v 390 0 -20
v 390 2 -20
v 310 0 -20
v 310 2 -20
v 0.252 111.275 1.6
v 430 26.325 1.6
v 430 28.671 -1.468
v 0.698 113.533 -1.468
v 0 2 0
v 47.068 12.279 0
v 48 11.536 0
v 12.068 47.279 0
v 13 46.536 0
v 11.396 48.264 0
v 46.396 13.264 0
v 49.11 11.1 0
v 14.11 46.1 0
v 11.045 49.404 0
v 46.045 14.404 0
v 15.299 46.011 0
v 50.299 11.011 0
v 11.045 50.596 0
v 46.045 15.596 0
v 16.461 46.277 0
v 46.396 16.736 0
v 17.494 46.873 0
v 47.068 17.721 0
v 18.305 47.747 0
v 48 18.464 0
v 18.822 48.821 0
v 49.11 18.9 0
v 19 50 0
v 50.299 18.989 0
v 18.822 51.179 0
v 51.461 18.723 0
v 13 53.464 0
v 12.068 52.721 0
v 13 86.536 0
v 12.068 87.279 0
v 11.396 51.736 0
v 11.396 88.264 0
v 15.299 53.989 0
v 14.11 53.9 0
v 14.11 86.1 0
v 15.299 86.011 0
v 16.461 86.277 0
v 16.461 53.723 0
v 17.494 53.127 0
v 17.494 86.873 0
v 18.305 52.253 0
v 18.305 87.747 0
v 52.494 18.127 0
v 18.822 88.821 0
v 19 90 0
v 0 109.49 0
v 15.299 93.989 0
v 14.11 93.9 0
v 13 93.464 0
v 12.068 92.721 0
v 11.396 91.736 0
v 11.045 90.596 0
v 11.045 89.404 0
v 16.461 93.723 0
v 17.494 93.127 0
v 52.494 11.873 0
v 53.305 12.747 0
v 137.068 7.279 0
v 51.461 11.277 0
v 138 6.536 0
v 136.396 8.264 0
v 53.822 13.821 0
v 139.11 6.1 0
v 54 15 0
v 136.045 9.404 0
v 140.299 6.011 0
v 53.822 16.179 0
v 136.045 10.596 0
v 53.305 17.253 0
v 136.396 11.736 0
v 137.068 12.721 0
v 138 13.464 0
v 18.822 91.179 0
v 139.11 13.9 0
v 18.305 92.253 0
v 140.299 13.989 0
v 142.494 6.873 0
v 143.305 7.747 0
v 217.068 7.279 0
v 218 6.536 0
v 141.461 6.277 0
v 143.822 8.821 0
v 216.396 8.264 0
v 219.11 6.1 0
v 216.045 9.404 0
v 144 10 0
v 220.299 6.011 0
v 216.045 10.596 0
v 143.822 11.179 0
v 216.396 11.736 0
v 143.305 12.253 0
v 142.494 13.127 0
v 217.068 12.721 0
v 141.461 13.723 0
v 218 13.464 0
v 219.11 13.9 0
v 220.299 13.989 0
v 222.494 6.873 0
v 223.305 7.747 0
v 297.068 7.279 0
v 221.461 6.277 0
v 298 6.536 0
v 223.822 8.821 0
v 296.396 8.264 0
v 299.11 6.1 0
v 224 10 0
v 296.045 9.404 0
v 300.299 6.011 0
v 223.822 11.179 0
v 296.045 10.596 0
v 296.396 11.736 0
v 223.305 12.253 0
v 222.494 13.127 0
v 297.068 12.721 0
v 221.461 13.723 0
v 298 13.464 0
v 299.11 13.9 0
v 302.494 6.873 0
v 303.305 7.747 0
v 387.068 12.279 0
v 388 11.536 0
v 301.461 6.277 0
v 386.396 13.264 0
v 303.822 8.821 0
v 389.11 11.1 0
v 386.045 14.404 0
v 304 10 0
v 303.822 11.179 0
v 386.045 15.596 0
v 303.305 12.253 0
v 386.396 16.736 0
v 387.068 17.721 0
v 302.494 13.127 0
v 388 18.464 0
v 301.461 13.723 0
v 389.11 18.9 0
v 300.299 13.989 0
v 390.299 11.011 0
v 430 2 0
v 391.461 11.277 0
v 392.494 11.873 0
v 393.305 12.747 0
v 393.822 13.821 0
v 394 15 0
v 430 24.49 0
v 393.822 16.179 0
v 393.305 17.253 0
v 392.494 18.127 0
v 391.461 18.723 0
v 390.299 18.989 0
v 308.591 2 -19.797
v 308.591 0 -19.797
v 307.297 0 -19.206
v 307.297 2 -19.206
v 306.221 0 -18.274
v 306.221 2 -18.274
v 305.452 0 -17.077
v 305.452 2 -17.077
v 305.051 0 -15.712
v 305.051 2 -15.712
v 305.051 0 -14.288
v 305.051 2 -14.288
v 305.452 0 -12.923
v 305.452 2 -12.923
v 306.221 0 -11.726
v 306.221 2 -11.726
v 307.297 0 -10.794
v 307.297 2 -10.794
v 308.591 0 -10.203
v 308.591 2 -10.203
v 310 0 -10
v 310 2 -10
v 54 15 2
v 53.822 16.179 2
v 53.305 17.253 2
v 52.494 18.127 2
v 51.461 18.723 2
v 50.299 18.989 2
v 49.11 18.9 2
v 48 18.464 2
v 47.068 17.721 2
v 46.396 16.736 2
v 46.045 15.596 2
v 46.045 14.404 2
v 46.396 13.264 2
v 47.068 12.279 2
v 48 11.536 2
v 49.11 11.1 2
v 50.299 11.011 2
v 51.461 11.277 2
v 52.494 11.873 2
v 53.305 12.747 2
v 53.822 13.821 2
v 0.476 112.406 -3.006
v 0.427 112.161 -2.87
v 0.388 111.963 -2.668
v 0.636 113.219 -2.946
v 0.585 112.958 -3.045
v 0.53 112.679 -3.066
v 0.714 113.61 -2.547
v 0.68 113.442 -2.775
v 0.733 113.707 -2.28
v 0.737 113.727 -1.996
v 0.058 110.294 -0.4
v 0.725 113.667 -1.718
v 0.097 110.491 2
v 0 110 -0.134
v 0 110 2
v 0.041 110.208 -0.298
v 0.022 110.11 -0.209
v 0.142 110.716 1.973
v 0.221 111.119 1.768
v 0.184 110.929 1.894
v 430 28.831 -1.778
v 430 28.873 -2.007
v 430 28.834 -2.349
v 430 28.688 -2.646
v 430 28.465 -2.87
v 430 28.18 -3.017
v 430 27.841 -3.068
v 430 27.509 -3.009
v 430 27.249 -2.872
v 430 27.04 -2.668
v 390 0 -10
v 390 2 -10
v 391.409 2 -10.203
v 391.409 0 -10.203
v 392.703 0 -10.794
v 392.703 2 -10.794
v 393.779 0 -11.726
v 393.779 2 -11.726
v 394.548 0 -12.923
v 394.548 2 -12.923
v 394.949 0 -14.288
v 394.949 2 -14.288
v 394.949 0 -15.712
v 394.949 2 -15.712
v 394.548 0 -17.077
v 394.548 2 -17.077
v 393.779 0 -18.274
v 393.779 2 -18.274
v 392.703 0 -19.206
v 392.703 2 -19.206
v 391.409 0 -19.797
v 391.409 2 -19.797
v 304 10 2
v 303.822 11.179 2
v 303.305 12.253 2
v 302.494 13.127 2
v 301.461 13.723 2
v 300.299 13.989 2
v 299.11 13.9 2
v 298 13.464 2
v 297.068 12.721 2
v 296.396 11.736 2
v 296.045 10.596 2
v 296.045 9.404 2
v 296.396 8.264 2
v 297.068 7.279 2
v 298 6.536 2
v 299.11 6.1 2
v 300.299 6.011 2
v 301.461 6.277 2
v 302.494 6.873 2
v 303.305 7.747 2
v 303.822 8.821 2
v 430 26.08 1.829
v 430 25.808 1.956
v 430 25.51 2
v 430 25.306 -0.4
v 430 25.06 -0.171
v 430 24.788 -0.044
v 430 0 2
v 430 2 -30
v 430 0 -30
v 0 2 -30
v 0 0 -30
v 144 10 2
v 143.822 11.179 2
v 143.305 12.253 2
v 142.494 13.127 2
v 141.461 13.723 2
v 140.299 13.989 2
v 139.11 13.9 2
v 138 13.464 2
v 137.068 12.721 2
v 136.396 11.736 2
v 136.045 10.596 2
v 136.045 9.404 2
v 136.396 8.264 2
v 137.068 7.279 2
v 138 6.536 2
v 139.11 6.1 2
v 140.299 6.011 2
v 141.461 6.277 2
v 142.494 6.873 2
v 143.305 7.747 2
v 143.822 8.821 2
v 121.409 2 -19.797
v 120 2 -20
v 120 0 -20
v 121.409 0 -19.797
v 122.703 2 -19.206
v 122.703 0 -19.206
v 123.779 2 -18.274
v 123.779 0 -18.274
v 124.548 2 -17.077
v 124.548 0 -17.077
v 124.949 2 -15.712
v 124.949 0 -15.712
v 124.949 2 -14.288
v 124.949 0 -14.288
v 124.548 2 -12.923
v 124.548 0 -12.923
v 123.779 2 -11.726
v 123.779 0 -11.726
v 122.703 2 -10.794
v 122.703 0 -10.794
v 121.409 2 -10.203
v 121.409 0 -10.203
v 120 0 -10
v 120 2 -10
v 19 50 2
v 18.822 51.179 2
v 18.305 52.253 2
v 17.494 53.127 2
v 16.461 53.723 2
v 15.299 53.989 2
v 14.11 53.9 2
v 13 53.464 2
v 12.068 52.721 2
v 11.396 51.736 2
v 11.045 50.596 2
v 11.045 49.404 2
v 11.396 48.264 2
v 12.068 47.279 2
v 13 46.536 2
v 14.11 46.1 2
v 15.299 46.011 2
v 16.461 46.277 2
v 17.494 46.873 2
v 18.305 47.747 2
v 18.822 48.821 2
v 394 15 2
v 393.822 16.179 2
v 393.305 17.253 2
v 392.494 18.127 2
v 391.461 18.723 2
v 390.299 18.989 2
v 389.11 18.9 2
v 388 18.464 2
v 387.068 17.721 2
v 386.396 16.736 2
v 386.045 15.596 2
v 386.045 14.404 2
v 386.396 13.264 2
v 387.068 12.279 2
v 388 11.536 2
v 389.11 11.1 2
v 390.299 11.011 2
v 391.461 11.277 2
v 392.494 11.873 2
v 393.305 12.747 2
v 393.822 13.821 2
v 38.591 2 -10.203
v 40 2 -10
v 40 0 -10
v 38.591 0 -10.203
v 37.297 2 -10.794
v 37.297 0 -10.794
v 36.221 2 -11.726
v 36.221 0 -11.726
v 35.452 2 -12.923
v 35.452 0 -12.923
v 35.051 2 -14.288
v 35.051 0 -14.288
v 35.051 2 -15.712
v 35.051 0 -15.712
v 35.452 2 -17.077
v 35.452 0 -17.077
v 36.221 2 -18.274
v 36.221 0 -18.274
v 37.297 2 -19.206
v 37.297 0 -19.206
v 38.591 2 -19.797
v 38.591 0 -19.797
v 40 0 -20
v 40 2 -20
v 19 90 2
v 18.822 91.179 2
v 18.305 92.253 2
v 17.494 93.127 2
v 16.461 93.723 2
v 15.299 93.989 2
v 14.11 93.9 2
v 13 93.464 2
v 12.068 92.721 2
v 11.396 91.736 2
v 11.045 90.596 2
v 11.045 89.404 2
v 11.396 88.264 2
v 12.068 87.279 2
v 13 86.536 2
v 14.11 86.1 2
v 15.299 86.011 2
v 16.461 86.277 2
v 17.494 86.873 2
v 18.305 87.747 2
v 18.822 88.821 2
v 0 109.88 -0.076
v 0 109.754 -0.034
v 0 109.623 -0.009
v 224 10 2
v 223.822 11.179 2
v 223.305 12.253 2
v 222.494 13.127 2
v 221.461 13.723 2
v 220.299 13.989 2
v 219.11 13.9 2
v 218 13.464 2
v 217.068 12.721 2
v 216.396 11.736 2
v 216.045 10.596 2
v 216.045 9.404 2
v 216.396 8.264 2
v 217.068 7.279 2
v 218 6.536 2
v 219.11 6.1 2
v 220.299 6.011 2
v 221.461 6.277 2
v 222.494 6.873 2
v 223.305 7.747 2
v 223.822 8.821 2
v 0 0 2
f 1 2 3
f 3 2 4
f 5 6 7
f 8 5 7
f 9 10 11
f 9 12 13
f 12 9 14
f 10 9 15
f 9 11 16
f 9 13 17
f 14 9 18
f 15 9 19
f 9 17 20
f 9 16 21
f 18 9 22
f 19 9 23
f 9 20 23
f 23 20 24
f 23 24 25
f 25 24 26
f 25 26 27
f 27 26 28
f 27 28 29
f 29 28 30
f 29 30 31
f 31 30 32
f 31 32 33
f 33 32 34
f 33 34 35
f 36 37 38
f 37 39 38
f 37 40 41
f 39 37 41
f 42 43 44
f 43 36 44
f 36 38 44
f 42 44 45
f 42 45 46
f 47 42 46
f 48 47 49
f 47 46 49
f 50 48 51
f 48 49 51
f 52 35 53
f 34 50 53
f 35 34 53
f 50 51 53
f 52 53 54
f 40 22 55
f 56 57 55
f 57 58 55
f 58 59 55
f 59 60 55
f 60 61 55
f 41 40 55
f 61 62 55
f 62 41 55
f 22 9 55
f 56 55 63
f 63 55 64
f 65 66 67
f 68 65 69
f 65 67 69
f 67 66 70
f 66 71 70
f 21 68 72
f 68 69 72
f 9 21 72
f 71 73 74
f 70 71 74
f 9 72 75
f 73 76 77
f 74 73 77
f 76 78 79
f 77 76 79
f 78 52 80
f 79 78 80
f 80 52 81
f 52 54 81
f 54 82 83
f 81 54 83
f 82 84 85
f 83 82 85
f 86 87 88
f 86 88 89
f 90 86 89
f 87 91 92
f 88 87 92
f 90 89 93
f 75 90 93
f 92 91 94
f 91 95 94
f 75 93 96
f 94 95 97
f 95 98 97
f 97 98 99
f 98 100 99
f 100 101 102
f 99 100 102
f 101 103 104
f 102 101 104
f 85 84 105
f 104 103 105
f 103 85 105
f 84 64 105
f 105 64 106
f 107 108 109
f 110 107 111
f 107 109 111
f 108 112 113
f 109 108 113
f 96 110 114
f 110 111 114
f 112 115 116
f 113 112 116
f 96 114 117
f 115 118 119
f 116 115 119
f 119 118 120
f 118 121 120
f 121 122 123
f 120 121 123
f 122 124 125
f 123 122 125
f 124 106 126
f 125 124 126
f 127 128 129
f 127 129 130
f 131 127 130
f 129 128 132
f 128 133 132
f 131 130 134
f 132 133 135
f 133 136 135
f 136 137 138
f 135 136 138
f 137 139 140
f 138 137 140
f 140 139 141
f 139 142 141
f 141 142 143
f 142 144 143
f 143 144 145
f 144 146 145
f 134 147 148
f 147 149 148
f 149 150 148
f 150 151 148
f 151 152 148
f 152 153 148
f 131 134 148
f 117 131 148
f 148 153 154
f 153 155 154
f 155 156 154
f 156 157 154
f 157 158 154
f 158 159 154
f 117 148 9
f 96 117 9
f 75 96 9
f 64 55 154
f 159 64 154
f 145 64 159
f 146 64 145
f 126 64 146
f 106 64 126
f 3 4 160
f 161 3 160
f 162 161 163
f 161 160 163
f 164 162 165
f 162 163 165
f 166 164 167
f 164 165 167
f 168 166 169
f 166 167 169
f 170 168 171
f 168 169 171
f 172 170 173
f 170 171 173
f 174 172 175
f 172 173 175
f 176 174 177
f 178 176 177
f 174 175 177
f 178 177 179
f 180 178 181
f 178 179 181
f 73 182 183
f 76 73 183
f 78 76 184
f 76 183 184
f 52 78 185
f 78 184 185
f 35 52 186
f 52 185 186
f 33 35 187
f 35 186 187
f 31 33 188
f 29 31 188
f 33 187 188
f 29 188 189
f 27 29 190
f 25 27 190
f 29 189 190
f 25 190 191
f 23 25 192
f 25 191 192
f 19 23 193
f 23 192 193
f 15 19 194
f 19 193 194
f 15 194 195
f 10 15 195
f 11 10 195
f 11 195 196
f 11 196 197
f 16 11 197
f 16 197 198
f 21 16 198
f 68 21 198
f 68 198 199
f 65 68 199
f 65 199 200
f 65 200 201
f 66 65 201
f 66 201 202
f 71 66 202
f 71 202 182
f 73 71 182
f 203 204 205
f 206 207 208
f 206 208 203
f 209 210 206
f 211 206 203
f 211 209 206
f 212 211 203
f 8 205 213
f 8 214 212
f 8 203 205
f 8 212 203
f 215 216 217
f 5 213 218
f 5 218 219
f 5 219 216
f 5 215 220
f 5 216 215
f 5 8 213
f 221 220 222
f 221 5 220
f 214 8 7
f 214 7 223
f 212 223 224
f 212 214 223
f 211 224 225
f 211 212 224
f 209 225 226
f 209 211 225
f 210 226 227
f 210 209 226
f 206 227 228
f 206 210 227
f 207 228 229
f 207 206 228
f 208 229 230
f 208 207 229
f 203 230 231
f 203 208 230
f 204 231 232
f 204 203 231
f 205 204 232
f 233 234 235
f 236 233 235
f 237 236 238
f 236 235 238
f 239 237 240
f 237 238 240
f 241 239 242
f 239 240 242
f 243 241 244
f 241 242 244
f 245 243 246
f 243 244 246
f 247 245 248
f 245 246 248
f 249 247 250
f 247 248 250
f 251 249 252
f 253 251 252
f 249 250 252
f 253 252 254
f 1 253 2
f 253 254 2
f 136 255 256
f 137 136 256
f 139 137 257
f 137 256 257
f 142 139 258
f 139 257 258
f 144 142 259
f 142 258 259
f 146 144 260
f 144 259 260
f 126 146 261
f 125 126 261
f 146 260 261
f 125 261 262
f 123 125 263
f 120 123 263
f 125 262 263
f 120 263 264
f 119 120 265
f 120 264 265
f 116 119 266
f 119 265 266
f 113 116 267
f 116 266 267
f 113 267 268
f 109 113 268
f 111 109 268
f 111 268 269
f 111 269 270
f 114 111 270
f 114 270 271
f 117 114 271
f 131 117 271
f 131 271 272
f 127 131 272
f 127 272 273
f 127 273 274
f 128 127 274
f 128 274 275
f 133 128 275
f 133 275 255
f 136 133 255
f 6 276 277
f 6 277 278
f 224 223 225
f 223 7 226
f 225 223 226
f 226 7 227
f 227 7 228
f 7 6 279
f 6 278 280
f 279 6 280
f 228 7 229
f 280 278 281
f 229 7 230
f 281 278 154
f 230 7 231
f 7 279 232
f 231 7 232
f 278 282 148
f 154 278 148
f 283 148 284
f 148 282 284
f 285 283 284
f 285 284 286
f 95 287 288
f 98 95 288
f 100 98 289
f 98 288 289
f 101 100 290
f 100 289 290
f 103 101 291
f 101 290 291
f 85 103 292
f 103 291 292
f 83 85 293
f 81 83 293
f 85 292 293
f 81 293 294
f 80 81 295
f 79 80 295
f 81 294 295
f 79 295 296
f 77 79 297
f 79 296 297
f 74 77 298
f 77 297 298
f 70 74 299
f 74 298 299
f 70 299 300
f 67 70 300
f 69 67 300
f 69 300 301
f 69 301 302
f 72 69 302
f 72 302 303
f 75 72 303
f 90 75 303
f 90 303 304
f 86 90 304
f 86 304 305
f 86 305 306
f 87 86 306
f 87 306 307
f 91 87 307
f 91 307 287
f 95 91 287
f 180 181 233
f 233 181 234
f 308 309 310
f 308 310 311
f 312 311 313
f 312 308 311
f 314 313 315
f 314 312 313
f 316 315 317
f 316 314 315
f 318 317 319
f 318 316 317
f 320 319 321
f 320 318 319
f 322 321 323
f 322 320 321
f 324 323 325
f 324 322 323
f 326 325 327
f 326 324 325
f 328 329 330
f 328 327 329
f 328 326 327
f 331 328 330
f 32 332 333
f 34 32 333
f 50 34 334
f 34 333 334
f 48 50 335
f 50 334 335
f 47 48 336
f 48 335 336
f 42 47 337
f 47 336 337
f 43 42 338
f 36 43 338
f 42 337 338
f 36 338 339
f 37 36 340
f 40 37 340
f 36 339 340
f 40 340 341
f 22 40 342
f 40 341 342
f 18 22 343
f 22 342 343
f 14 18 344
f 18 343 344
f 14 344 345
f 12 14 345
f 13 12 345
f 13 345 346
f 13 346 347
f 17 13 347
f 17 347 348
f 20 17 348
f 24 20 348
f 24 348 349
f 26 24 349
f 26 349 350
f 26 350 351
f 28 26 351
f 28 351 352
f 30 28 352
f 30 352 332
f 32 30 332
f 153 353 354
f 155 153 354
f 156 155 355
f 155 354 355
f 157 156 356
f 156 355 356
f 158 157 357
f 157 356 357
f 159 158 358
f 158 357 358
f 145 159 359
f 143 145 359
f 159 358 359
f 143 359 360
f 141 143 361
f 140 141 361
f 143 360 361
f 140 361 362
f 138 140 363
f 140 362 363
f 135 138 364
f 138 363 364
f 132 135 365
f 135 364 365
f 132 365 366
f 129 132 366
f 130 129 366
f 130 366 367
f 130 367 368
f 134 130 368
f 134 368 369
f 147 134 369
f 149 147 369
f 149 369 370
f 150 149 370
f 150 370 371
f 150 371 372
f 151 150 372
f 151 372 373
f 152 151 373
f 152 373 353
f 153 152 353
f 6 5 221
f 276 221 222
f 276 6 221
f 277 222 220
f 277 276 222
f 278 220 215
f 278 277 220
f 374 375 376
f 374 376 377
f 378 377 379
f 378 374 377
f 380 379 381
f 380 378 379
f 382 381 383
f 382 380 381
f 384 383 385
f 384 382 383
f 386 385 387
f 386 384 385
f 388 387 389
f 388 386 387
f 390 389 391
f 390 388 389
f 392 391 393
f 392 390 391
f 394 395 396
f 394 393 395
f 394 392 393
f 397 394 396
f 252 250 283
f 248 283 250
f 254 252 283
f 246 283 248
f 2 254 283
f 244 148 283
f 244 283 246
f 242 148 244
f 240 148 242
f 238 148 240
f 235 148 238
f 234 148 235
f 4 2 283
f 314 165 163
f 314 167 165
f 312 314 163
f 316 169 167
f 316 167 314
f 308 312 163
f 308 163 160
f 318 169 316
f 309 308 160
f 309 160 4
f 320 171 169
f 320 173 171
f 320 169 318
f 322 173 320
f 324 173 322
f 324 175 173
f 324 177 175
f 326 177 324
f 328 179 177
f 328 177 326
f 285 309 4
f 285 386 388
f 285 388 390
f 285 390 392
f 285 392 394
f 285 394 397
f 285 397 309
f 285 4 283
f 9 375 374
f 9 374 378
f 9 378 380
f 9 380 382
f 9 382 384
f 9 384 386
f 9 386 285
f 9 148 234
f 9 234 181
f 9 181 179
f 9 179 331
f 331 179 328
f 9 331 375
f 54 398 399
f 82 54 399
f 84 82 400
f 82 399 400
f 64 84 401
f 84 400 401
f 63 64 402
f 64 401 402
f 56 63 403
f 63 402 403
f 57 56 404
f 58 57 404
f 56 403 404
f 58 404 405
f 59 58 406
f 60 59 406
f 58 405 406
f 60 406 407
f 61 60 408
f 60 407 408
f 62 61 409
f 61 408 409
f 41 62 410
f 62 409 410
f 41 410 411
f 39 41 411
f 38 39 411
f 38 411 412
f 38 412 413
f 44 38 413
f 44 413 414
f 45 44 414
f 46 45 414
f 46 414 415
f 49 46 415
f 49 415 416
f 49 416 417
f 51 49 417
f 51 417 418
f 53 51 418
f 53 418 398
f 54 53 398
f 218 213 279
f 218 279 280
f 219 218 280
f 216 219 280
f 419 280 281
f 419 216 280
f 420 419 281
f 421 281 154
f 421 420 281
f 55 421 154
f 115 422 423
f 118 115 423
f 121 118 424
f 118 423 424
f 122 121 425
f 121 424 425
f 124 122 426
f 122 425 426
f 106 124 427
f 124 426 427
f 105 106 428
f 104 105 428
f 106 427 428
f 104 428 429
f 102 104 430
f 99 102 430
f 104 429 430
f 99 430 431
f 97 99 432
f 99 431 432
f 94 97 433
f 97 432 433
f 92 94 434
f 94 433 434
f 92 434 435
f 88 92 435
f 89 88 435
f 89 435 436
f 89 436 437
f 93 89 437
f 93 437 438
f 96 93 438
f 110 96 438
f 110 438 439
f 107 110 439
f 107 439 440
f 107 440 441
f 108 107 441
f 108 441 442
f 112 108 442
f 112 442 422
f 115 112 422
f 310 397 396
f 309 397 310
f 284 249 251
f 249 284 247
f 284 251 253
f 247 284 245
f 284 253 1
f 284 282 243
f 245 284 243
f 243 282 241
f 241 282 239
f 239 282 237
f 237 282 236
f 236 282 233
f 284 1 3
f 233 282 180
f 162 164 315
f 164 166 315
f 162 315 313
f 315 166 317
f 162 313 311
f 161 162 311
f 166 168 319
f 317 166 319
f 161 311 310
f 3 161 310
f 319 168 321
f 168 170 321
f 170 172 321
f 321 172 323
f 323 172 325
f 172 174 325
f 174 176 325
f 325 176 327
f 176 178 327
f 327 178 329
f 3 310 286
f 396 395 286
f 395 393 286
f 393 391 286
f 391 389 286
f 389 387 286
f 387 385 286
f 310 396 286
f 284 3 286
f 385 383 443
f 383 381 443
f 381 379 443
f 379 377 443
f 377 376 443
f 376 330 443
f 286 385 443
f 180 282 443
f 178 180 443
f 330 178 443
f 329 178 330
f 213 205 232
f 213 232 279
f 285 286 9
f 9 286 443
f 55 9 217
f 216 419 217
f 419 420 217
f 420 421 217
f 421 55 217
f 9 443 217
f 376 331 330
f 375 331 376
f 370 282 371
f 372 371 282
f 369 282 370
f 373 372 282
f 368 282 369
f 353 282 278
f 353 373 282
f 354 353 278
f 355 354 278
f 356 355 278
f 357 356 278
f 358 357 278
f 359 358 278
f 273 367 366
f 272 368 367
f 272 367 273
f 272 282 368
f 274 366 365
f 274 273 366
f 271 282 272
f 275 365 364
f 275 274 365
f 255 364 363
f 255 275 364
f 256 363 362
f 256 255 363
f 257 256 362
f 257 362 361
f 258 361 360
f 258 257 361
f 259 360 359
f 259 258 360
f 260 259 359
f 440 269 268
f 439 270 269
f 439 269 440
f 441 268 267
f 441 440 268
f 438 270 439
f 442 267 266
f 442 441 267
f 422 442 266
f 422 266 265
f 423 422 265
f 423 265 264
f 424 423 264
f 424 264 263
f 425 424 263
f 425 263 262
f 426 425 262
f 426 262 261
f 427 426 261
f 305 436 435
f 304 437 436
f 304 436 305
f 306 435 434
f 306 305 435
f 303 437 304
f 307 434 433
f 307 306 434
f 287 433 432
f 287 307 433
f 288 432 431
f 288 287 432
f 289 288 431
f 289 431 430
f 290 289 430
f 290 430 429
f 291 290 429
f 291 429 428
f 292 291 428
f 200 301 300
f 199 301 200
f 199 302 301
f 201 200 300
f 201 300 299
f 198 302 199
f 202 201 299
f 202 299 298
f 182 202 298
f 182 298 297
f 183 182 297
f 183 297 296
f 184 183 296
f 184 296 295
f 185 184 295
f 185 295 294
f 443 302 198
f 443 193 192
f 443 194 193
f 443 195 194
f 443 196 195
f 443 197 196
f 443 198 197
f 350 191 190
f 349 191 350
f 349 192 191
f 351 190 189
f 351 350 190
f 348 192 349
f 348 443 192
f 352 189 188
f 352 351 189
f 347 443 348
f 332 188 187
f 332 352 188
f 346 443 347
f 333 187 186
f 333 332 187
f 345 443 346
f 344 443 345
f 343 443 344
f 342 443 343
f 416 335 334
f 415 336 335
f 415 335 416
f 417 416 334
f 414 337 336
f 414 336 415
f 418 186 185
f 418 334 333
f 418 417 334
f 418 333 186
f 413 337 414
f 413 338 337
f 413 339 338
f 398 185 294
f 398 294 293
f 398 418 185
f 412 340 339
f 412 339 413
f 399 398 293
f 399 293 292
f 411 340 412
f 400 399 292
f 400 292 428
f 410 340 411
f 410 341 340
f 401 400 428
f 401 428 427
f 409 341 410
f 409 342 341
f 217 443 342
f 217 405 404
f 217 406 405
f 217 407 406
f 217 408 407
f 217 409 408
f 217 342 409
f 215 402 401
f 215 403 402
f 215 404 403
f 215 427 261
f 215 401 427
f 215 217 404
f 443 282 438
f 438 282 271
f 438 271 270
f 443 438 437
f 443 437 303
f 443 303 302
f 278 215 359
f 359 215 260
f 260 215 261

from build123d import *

# Parameters (mm, degrees)
BOSS_EXTRUDE1_DEPTH = 2
SKETCH3_W           = 430
SKETCH3_H           = 2
BOSS_EXTRUDE2_DEPTH = 30
CUT_EXTRUDE1_DEPTH  = 50
SKETCH7_R           = 4
CUT_EXTRUDE2_DEPTH  = 445.998876403
SKETCH8_R           = 4
CUT_EXTRUDE3_DEPTH  = 445.998876403
BOSS_EXTRUDE4_REACH = 466.157
FILLET3_R           = 1


with BuildPart() as part:
    # Sketch2 → Boss-Extrude1 (new body)
    with BuildSketch(Plane.XY):
        Polygon((0, 0), (430, 0), (430, 25), (0, 110), align=None)
    extrude(amount=BOSS_EXTRUDE1_DEPTH)

    # Sketch3 → Boss-Extrude2 (add)
    with BuildSketch(Plane(origin=(0, 0, 0), x_dir=(-1, 0, 0), z_dir=(0, 0, -1))):
        with Locations((-215, 1)):
            Rectangle(SKETCH3_W, SKETCH3_H)
    extrude(amount=BOSS_EXTRUDE2_DEPTH)

    # Sketch4 → Cut-Extrude1 (cut)
    with BuildSketch(Plane(origin=(0, 2, 0), x_dir=(1, 0, 0), z_dir=(0, 1, 0))):
        with BuildLine():
            Line((40, 20), (120, 20))
            ThreePointArc((120, 20), (125, 15), (120, 10))
            Line((120, 10), (40, 10))
            ThreePointArc((40, 10), (35, 15), (40, 20))
        make_face()
        with BuildLine():
            Line((390, 20), (310, 20))
            ThreePointArc((310, 20), (305, 15), (310, 10))
            Line((310, 10), (390, 10))
            ThreePointArc((390, 10), (395, 15), (390, 20))
        make_face()
    extrude(amount=-CUT_EXTRUDE1_DEPTH, mode=Mode.SUBTRACT)

    # Sketch7 → Cut-Extrude2 (cut, through all)
    with BuildSketch(Plane.XY.offset(2)):
        with Locations((15, 50)):
            Circle(SKETCH7_R)
        with Locations((50, 15)):
            Circle(SKETCH7_R)
        with Locations((390, 15)):
            Circle(SKETCH7_R)
        with Locations((15, 90)):
            Circle(SKETCH7_R)
    extrude(amount=-CUT_EXTRUDE2_DEPTH, mode=Mode.SUBTRACT)

    # Sketch8 → Cut-Extrude3 (cut, through all)
    with BuildSketch(Plane.XY.offset(2)):
        with Locations((140, 10)):
            Circle(SKETCH8_R)
        with Locations((220, 10)):
            Circle(SKETCH8_R)
        with Locations((300, 10)):
            Circle(SKETCH8_R)
    extrude(amount=-CUT_EXTRUDE3_DEPTH, mode=Mode.SUBTRACT)

    # Boss-Extrude4: up to this plane
    boss_extrude4_end = Plane(origin=(430, 0, 2), z_dir=(-1, 0, 0))
    # Sketch12 → Boss-Extrude4 (add, up to the surface)
    with BuildSketch(Plane(origin=(-20.926480156, 4.136629798, 0), x_dir=(0, 0, -1), z_dir=(0.9810169593645325, -0.19392195708368665, 0)), mode=Mode.PRIVATE) as boss_extrude4_sk1:
        with BuildLine():
            Line((2.668468057, 109.913216573), (0, 107.91186553))
            Line((0, 107.91186553), (-2, 107.91186553))
            Line((-2, 107.91186553), (-2, 108.91186553))
            Line((-2, 108.91186553), (1.468468057, 111.513216573))
            ThreePointArc((1.468468057, 111.513216573), (2.868468057, 111.313216573), (2.668468057, 109.913216573))
        make_face()
    boss_extrude4_tool1 = split(extrude(boss_extrude4_sk1.sketch, amount=BOSS_EXTRUDE4_REACH, mode=Mode.PRIVATE), bisect_by=boss_extrude4_end, keep=Keep.BOTH, mode=Mode.PRIVATE)
    add(boss_extrude4_tool1.solids().sort_by_distance((0.341058, 111.725355, -0.613229))[0])

    # Fillet3
    fillet3_edges = [part.edges().sort_by_distance(p)[0] for p in [
        (215.096960979, 68.500183664, 2),
        (215, 67.5, 0),
    ]]
    fillet(fillet3_edges, radius=FILLET3_R)


solid = part.part
